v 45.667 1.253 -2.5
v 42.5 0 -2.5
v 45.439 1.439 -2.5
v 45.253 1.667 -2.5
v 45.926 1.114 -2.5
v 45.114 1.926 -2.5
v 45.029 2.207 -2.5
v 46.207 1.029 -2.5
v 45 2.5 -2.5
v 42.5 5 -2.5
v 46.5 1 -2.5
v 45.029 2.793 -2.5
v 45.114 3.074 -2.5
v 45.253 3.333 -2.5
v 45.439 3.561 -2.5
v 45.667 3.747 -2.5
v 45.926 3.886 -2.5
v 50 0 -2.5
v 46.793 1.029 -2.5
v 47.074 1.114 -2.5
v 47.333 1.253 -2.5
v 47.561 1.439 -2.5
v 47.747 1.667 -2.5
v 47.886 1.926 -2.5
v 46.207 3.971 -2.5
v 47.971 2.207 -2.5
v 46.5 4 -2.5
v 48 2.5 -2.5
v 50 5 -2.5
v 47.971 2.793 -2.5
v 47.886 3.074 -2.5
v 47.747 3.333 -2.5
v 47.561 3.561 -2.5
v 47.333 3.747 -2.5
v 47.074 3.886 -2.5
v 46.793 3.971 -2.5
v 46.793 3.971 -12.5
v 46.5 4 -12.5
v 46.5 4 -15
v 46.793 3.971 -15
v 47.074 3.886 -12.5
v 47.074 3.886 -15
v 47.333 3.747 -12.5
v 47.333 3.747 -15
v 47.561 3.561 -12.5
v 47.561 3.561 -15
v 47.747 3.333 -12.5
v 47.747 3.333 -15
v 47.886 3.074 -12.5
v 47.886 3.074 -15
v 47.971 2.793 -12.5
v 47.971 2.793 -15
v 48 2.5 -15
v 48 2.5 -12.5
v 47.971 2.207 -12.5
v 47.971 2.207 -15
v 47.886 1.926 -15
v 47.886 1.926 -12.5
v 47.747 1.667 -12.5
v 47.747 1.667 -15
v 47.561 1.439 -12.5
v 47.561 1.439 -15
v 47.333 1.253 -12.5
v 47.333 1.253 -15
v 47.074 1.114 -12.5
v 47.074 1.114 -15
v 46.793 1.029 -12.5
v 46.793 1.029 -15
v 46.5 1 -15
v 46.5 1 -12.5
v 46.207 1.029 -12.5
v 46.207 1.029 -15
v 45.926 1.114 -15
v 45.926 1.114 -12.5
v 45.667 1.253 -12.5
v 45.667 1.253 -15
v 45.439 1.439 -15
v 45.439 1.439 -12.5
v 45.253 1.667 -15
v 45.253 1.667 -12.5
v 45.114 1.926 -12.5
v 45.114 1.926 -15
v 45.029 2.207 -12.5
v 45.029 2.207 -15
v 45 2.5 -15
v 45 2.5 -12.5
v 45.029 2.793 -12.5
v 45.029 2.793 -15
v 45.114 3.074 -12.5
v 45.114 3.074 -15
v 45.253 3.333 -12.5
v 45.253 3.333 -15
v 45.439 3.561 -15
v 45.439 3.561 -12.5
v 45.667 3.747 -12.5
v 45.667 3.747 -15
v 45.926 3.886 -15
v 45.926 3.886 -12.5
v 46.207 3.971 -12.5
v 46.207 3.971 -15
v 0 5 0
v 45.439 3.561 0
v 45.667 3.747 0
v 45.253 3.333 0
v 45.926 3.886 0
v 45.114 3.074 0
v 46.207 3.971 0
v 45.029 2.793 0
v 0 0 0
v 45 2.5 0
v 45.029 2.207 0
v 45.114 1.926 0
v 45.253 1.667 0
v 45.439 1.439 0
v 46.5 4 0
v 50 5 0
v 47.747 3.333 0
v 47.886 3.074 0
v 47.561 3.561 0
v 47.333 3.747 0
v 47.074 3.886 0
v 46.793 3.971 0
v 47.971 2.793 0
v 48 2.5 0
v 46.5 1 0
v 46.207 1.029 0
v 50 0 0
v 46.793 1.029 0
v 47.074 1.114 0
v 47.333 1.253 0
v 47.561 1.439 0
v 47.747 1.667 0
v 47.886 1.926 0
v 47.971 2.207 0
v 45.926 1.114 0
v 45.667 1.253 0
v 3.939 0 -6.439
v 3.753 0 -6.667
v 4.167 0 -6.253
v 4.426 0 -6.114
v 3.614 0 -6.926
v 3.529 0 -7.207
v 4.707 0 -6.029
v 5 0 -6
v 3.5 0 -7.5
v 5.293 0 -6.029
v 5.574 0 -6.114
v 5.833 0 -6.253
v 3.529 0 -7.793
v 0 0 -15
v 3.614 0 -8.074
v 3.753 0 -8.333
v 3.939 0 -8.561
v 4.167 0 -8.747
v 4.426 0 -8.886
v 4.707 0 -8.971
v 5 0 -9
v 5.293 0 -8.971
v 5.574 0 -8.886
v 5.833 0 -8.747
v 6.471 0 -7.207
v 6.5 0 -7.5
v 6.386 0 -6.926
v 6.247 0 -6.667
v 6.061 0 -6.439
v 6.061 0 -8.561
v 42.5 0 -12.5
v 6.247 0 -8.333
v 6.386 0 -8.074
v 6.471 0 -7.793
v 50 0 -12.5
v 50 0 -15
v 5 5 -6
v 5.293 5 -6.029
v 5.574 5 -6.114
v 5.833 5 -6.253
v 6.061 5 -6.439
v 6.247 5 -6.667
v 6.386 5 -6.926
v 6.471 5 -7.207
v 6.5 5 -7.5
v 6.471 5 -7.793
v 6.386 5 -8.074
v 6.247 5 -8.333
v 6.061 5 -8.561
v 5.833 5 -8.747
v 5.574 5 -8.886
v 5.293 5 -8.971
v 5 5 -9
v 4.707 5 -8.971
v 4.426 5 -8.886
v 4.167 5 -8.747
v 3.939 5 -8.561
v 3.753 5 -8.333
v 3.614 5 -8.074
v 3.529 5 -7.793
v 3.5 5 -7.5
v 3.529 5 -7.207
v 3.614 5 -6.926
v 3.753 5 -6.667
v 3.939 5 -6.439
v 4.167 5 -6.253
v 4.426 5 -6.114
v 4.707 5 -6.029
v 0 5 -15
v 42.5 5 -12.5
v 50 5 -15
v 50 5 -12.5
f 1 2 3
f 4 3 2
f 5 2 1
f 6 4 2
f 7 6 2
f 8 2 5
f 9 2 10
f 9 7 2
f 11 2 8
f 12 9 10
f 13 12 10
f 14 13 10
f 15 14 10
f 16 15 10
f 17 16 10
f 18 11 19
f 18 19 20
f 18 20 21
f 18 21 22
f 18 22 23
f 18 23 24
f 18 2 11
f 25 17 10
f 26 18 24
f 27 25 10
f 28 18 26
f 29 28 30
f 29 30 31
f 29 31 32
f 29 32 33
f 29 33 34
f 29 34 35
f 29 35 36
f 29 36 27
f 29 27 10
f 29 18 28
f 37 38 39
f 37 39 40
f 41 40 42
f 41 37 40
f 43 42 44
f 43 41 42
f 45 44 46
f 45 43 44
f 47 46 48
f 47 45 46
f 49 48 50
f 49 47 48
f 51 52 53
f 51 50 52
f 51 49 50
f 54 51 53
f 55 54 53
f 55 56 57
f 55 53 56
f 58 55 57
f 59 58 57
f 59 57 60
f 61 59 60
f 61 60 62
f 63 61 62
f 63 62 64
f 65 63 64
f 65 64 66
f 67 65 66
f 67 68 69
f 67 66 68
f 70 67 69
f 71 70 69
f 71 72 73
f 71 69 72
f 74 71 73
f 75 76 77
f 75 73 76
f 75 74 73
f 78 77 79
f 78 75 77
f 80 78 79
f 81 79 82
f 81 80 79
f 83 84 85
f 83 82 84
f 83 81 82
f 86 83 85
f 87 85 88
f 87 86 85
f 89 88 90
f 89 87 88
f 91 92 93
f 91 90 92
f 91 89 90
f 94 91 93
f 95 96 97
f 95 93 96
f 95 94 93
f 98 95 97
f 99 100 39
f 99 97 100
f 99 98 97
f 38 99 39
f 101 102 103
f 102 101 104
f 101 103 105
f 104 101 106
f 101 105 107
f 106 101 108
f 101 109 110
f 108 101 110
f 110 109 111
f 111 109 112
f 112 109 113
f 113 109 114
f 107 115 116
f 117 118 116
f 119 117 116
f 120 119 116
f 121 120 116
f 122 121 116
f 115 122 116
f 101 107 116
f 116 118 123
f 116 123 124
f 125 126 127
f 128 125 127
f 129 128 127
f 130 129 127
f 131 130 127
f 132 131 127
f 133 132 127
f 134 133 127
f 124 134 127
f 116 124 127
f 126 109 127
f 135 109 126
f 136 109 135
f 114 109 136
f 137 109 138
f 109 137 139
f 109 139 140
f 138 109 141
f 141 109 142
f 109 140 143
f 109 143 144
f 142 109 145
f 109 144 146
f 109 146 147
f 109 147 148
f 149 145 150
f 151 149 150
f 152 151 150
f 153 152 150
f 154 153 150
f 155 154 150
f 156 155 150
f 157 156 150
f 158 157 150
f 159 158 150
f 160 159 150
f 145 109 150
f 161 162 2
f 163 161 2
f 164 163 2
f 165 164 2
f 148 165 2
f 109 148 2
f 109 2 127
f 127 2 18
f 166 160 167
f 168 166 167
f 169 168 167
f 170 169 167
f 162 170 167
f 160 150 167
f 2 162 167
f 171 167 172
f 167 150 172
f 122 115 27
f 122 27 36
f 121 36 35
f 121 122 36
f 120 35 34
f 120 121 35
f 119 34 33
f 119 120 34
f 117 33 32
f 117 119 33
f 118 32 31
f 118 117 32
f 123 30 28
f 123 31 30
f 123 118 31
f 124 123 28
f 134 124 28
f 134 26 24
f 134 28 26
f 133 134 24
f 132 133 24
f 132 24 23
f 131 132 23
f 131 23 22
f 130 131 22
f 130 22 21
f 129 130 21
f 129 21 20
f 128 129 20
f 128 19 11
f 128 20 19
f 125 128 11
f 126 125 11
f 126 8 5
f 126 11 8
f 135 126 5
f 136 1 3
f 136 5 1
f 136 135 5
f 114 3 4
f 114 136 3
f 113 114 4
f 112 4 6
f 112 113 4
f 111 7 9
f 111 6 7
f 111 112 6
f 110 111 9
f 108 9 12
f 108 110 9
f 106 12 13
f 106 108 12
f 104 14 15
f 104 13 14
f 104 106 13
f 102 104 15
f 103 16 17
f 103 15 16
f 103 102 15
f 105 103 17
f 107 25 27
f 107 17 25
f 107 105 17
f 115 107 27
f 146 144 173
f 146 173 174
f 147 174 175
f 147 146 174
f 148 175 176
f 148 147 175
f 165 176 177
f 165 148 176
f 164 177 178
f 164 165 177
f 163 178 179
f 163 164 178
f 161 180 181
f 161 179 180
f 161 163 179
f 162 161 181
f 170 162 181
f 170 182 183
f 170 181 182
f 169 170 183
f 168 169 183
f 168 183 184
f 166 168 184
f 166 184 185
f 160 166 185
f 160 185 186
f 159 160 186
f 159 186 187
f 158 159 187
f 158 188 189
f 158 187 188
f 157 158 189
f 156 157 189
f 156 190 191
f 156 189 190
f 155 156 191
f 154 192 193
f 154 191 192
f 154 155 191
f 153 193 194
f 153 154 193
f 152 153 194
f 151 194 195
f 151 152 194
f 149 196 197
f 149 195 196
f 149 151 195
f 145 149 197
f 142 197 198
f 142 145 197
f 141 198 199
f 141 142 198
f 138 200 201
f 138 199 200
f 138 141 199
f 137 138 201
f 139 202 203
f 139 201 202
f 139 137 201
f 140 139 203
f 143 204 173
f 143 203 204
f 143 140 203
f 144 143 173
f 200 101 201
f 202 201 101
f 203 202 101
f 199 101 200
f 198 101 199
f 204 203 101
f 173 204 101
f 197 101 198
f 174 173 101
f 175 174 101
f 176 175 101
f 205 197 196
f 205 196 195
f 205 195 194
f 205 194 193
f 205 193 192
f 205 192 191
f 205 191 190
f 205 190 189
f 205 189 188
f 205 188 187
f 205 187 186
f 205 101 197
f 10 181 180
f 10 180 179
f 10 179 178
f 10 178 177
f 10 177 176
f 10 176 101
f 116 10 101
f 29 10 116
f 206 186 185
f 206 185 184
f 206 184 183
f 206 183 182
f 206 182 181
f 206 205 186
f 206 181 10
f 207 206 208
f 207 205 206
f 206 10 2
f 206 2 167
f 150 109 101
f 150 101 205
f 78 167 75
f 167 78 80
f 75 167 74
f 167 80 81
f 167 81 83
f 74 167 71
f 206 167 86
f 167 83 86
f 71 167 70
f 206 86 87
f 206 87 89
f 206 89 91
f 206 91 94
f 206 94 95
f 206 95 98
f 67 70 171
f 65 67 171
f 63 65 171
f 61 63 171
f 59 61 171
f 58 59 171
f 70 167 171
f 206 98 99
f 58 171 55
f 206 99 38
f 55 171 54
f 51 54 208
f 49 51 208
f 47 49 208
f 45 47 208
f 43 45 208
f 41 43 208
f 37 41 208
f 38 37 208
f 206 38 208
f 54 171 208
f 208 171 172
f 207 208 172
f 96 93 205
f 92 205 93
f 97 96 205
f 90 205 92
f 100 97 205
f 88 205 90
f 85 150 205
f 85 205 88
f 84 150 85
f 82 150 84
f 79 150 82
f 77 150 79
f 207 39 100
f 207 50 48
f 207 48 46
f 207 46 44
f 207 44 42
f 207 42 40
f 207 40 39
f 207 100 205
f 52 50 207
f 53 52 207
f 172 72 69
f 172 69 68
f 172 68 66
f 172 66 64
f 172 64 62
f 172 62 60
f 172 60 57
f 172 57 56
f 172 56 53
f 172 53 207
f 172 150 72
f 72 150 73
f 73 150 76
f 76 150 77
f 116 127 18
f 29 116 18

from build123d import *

# Parameters (mm, degrees)
SKETCH1_W               = 50
SKETCH1_H               = 15
BOSS_EXTRUDE1_DEPTH     = 5
CUT_EXTRUDE1_DEPTH      = 53.440442409
CUT_EXTRUDE1_DEPTH_BACK = 53.440442409
SKETCH2_R               = 1.5
SKETCH3_W               = 10
SKETCH3_H               = 5
CUT_EXTRUDE2_DEPTH      = 7.5
CUT_EXTRUDE3_DEPTH      = 53.440442409
CUT_EXTRUDE3_DEPTH_BACK = 53.440442409
SKETCH4_R               = 1.5


with BuildPart() as part:
    # Sketch1 → Boss-Extrude1 (new body)
    with BuildSketch(Plane(origin=(0, 0, 0), x_dir=(1, 0, 0), z_dir=(0, 1, 0))):
        with Locations((25, 7.5)):
            Rectangle(SKETCH1_W, SKETCH1_H)
    extrude(amount=BOSS_EXTRUDE1_DEPTH)

    # Sketch2 → Cut-Extrude1 (cut, two sides: drawn at the far end of the back side and taken through both)
    with BuildSketch(Plane(origin=(0, 5, 0), x_dir=(1, 0, 0), z_dir=(0, 1, 0)).offset(-CUT_EXTRUDE1_DEPTH_BACK)):
        with Locations(Location((5, 7.5, 0), (0, 0, 270))):
            Circle(SKETCH2_R)
    extrude(amount=CUT_EXTRUDE1_DEPTH + CUT_EXTRUDE1_DEPTH_BACK, mode=Mode.SUBTRACT)

    # Sketch3 → Cut-Extrude2 (cut)
    with BuildSketch(Plane(origin=(50, 0, 0), x_dir=(0, 0, -1), z_dir=(1, 0, 0))):
        with Locations((7.5, 2.5)):
            Rectangle(SKETCH3_W, SKETCH3_H)
    extrude(amount=-CUT_EXTRUDE2_DEPTH, mode=Mode.SUBTRACT)

    # Sketch4 → Cut-Extrude3 (cut, two sides: drawn at the far end of the back side and taken through both)
    with BuildSketch(Plane(origin=(0, 0, -15), x_dir=(-1, 0, 0), z_dir=(0, 0, -1)).offset(-CUT_EXTRUDE3_DEPTH_BACK)):
        with Locations(Location((-46.5, 2.5, 0), (0, 0, 90))):
            Circle(SKETCH4_R)
    extrude(amount=CUT_EXTRUDE3_DEPTH + CUT_EXTRUDE3_DEPTH_BACK, mode=Mode.SUBTRACT)


solid = part.part
